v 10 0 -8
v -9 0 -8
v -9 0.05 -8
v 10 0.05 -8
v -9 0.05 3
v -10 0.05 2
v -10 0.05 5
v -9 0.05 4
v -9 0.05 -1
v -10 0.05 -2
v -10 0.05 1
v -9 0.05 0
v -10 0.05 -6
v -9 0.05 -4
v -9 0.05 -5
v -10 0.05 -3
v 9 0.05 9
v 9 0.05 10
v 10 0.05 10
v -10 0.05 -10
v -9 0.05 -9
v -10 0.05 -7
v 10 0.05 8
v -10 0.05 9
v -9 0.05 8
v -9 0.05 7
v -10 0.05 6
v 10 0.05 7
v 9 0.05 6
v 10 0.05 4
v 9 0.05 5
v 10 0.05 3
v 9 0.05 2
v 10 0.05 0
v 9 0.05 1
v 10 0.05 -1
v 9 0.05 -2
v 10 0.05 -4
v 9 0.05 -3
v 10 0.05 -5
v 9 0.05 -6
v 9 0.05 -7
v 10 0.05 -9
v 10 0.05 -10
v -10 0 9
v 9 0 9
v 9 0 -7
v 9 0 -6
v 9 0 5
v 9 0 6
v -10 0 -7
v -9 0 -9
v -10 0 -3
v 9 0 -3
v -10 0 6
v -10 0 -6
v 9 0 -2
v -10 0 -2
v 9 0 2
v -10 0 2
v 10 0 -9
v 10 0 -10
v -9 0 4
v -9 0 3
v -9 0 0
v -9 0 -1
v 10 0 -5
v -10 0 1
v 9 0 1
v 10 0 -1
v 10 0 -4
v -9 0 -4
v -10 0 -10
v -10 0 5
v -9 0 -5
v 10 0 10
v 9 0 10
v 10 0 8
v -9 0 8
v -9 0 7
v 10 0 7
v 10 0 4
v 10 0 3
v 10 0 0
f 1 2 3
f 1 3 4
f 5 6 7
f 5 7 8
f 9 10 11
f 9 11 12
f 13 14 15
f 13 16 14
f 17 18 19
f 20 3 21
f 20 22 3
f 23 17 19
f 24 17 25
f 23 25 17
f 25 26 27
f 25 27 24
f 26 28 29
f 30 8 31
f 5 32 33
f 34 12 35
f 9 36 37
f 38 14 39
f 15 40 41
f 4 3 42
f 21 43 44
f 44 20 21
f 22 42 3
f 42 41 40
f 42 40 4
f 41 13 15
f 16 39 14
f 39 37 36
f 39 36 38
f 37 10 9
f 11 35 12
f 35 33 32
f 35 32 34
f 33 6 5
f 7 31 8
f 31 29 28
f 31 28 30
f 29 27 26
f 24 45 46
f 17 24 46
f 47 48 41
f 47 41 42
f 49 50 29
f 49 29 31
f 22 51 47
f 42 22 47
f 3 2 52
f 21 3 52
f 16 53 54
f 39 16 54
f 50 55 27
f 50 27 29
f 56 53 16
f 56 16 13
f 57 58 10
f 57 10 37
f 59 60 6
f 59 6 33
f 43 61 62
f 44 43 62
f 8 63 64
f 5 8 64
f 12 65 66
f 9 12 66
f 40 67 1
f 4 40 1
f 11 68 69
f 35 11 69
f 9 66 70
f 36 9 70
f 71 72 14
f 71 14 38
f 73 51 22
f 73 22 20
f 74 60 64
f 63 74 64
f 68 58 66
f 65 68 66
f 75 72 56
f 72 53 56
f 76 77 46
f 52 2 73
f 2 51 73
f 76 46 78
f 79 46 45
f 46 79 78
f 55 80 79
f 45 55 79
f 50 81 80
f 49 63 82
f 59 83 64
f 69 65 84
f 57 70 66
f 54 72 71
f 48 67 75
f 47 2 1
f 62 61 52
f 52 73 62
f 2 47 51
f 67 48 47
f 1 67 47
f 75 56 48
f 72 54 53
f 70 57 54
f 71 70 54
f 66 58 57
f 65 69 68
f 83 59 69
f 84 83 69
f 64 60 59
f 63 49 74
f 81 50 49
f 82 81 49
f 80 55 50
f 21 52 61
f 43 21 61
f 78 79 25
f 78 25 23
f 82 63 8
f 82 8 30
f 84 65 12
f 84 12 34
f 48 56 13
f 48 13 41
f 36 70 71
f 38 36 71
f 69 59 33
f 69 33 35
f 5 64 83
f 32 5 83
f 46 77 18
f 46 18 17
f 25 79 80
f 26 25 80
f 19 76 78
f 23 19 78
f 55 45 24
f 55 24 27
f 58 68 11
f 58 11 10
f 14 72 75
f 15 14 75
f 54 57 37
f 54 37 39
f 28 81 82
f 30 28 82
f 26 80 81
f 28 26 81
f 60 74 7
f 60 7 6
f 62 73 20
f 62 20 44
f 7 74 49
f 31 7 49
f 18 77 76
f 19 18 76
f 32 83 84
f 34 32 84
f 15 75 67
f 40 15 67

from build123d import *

# Parameters (mm, degrees)
BASE_D_W            = 20
BASE_D_H            = 20
BOSS_EXTRUDE1_DEPTH = 0.05
CUTR_W              = 19
CUTR_H              = 1
CUTRIGHT_DEPTH      = 15.142224012
CUTL_W              = 19
CUTL_H              = 1
CUTLEFT_DEPTH       = 15.142224012
PATT_RIGHT_COUNT    = 5
PATT_RIGHT_PITCH    = 4
PATT_LEFT_COUNT     = 5
PATT_LEFT_PITCH     = 4


with BuildPart() as part:
    # Base D → Boss-Extrude1 (new body)
    with BuildSketch(Plane(origin=(0, 0, 0), x_dir=(1, 0, 0), z_dir=(0, 1, 0))):
        Rectangle(BASE_D_W, BASE_D_H)
    extrude(amount=BOSS_EXTRUDE1_DEPTH)

    # cutR → CutRight (cut, through all)
    with BuildSketch(Plane(origin=(0, 0, 0), x_dir=(1, 0, 0), z_dir=(0, 1, 0))):
        with Locations((0.5, 8.5)):
            Rectangle(CUTR_W, CUTR_H)
    cutright = extrude(amount=CUTRIGHT_DEPTH, mode=Mode.SUBTRACT)

    # cutL → CutLeft (cut, through all)
    with BuildSketch(Plane(origin=(0, 0, 0), x_dir=(1, 0, 0), z_dir=(0, 1, 0))):
        with Locations((-0.5, 6.5)):
            Rectangle(CUTL_W, CUTL_H)
    cutleft = extrude(amount=CUTLEFT_DEPTH, mode=Mode.SUBTRACT)

    # Patt Right: CutRight ×5
    with Locations(*[(0, 0, i * PATT_RIGHT_PITCH) for i in range(1, PATT_RIGHT_COUNT)]):
        add(cutright, mode=Mode.SUBTRACT)

    # Patt Left: CutLeft ×5
    with Locations(*[(0, 0, i * PATT_LEFT_PITCH) for i in range(1, PATT_LEFT_COUNT)]):
        add(cutleft, mode=Mode.SUBTRACT)


solid = part.part
